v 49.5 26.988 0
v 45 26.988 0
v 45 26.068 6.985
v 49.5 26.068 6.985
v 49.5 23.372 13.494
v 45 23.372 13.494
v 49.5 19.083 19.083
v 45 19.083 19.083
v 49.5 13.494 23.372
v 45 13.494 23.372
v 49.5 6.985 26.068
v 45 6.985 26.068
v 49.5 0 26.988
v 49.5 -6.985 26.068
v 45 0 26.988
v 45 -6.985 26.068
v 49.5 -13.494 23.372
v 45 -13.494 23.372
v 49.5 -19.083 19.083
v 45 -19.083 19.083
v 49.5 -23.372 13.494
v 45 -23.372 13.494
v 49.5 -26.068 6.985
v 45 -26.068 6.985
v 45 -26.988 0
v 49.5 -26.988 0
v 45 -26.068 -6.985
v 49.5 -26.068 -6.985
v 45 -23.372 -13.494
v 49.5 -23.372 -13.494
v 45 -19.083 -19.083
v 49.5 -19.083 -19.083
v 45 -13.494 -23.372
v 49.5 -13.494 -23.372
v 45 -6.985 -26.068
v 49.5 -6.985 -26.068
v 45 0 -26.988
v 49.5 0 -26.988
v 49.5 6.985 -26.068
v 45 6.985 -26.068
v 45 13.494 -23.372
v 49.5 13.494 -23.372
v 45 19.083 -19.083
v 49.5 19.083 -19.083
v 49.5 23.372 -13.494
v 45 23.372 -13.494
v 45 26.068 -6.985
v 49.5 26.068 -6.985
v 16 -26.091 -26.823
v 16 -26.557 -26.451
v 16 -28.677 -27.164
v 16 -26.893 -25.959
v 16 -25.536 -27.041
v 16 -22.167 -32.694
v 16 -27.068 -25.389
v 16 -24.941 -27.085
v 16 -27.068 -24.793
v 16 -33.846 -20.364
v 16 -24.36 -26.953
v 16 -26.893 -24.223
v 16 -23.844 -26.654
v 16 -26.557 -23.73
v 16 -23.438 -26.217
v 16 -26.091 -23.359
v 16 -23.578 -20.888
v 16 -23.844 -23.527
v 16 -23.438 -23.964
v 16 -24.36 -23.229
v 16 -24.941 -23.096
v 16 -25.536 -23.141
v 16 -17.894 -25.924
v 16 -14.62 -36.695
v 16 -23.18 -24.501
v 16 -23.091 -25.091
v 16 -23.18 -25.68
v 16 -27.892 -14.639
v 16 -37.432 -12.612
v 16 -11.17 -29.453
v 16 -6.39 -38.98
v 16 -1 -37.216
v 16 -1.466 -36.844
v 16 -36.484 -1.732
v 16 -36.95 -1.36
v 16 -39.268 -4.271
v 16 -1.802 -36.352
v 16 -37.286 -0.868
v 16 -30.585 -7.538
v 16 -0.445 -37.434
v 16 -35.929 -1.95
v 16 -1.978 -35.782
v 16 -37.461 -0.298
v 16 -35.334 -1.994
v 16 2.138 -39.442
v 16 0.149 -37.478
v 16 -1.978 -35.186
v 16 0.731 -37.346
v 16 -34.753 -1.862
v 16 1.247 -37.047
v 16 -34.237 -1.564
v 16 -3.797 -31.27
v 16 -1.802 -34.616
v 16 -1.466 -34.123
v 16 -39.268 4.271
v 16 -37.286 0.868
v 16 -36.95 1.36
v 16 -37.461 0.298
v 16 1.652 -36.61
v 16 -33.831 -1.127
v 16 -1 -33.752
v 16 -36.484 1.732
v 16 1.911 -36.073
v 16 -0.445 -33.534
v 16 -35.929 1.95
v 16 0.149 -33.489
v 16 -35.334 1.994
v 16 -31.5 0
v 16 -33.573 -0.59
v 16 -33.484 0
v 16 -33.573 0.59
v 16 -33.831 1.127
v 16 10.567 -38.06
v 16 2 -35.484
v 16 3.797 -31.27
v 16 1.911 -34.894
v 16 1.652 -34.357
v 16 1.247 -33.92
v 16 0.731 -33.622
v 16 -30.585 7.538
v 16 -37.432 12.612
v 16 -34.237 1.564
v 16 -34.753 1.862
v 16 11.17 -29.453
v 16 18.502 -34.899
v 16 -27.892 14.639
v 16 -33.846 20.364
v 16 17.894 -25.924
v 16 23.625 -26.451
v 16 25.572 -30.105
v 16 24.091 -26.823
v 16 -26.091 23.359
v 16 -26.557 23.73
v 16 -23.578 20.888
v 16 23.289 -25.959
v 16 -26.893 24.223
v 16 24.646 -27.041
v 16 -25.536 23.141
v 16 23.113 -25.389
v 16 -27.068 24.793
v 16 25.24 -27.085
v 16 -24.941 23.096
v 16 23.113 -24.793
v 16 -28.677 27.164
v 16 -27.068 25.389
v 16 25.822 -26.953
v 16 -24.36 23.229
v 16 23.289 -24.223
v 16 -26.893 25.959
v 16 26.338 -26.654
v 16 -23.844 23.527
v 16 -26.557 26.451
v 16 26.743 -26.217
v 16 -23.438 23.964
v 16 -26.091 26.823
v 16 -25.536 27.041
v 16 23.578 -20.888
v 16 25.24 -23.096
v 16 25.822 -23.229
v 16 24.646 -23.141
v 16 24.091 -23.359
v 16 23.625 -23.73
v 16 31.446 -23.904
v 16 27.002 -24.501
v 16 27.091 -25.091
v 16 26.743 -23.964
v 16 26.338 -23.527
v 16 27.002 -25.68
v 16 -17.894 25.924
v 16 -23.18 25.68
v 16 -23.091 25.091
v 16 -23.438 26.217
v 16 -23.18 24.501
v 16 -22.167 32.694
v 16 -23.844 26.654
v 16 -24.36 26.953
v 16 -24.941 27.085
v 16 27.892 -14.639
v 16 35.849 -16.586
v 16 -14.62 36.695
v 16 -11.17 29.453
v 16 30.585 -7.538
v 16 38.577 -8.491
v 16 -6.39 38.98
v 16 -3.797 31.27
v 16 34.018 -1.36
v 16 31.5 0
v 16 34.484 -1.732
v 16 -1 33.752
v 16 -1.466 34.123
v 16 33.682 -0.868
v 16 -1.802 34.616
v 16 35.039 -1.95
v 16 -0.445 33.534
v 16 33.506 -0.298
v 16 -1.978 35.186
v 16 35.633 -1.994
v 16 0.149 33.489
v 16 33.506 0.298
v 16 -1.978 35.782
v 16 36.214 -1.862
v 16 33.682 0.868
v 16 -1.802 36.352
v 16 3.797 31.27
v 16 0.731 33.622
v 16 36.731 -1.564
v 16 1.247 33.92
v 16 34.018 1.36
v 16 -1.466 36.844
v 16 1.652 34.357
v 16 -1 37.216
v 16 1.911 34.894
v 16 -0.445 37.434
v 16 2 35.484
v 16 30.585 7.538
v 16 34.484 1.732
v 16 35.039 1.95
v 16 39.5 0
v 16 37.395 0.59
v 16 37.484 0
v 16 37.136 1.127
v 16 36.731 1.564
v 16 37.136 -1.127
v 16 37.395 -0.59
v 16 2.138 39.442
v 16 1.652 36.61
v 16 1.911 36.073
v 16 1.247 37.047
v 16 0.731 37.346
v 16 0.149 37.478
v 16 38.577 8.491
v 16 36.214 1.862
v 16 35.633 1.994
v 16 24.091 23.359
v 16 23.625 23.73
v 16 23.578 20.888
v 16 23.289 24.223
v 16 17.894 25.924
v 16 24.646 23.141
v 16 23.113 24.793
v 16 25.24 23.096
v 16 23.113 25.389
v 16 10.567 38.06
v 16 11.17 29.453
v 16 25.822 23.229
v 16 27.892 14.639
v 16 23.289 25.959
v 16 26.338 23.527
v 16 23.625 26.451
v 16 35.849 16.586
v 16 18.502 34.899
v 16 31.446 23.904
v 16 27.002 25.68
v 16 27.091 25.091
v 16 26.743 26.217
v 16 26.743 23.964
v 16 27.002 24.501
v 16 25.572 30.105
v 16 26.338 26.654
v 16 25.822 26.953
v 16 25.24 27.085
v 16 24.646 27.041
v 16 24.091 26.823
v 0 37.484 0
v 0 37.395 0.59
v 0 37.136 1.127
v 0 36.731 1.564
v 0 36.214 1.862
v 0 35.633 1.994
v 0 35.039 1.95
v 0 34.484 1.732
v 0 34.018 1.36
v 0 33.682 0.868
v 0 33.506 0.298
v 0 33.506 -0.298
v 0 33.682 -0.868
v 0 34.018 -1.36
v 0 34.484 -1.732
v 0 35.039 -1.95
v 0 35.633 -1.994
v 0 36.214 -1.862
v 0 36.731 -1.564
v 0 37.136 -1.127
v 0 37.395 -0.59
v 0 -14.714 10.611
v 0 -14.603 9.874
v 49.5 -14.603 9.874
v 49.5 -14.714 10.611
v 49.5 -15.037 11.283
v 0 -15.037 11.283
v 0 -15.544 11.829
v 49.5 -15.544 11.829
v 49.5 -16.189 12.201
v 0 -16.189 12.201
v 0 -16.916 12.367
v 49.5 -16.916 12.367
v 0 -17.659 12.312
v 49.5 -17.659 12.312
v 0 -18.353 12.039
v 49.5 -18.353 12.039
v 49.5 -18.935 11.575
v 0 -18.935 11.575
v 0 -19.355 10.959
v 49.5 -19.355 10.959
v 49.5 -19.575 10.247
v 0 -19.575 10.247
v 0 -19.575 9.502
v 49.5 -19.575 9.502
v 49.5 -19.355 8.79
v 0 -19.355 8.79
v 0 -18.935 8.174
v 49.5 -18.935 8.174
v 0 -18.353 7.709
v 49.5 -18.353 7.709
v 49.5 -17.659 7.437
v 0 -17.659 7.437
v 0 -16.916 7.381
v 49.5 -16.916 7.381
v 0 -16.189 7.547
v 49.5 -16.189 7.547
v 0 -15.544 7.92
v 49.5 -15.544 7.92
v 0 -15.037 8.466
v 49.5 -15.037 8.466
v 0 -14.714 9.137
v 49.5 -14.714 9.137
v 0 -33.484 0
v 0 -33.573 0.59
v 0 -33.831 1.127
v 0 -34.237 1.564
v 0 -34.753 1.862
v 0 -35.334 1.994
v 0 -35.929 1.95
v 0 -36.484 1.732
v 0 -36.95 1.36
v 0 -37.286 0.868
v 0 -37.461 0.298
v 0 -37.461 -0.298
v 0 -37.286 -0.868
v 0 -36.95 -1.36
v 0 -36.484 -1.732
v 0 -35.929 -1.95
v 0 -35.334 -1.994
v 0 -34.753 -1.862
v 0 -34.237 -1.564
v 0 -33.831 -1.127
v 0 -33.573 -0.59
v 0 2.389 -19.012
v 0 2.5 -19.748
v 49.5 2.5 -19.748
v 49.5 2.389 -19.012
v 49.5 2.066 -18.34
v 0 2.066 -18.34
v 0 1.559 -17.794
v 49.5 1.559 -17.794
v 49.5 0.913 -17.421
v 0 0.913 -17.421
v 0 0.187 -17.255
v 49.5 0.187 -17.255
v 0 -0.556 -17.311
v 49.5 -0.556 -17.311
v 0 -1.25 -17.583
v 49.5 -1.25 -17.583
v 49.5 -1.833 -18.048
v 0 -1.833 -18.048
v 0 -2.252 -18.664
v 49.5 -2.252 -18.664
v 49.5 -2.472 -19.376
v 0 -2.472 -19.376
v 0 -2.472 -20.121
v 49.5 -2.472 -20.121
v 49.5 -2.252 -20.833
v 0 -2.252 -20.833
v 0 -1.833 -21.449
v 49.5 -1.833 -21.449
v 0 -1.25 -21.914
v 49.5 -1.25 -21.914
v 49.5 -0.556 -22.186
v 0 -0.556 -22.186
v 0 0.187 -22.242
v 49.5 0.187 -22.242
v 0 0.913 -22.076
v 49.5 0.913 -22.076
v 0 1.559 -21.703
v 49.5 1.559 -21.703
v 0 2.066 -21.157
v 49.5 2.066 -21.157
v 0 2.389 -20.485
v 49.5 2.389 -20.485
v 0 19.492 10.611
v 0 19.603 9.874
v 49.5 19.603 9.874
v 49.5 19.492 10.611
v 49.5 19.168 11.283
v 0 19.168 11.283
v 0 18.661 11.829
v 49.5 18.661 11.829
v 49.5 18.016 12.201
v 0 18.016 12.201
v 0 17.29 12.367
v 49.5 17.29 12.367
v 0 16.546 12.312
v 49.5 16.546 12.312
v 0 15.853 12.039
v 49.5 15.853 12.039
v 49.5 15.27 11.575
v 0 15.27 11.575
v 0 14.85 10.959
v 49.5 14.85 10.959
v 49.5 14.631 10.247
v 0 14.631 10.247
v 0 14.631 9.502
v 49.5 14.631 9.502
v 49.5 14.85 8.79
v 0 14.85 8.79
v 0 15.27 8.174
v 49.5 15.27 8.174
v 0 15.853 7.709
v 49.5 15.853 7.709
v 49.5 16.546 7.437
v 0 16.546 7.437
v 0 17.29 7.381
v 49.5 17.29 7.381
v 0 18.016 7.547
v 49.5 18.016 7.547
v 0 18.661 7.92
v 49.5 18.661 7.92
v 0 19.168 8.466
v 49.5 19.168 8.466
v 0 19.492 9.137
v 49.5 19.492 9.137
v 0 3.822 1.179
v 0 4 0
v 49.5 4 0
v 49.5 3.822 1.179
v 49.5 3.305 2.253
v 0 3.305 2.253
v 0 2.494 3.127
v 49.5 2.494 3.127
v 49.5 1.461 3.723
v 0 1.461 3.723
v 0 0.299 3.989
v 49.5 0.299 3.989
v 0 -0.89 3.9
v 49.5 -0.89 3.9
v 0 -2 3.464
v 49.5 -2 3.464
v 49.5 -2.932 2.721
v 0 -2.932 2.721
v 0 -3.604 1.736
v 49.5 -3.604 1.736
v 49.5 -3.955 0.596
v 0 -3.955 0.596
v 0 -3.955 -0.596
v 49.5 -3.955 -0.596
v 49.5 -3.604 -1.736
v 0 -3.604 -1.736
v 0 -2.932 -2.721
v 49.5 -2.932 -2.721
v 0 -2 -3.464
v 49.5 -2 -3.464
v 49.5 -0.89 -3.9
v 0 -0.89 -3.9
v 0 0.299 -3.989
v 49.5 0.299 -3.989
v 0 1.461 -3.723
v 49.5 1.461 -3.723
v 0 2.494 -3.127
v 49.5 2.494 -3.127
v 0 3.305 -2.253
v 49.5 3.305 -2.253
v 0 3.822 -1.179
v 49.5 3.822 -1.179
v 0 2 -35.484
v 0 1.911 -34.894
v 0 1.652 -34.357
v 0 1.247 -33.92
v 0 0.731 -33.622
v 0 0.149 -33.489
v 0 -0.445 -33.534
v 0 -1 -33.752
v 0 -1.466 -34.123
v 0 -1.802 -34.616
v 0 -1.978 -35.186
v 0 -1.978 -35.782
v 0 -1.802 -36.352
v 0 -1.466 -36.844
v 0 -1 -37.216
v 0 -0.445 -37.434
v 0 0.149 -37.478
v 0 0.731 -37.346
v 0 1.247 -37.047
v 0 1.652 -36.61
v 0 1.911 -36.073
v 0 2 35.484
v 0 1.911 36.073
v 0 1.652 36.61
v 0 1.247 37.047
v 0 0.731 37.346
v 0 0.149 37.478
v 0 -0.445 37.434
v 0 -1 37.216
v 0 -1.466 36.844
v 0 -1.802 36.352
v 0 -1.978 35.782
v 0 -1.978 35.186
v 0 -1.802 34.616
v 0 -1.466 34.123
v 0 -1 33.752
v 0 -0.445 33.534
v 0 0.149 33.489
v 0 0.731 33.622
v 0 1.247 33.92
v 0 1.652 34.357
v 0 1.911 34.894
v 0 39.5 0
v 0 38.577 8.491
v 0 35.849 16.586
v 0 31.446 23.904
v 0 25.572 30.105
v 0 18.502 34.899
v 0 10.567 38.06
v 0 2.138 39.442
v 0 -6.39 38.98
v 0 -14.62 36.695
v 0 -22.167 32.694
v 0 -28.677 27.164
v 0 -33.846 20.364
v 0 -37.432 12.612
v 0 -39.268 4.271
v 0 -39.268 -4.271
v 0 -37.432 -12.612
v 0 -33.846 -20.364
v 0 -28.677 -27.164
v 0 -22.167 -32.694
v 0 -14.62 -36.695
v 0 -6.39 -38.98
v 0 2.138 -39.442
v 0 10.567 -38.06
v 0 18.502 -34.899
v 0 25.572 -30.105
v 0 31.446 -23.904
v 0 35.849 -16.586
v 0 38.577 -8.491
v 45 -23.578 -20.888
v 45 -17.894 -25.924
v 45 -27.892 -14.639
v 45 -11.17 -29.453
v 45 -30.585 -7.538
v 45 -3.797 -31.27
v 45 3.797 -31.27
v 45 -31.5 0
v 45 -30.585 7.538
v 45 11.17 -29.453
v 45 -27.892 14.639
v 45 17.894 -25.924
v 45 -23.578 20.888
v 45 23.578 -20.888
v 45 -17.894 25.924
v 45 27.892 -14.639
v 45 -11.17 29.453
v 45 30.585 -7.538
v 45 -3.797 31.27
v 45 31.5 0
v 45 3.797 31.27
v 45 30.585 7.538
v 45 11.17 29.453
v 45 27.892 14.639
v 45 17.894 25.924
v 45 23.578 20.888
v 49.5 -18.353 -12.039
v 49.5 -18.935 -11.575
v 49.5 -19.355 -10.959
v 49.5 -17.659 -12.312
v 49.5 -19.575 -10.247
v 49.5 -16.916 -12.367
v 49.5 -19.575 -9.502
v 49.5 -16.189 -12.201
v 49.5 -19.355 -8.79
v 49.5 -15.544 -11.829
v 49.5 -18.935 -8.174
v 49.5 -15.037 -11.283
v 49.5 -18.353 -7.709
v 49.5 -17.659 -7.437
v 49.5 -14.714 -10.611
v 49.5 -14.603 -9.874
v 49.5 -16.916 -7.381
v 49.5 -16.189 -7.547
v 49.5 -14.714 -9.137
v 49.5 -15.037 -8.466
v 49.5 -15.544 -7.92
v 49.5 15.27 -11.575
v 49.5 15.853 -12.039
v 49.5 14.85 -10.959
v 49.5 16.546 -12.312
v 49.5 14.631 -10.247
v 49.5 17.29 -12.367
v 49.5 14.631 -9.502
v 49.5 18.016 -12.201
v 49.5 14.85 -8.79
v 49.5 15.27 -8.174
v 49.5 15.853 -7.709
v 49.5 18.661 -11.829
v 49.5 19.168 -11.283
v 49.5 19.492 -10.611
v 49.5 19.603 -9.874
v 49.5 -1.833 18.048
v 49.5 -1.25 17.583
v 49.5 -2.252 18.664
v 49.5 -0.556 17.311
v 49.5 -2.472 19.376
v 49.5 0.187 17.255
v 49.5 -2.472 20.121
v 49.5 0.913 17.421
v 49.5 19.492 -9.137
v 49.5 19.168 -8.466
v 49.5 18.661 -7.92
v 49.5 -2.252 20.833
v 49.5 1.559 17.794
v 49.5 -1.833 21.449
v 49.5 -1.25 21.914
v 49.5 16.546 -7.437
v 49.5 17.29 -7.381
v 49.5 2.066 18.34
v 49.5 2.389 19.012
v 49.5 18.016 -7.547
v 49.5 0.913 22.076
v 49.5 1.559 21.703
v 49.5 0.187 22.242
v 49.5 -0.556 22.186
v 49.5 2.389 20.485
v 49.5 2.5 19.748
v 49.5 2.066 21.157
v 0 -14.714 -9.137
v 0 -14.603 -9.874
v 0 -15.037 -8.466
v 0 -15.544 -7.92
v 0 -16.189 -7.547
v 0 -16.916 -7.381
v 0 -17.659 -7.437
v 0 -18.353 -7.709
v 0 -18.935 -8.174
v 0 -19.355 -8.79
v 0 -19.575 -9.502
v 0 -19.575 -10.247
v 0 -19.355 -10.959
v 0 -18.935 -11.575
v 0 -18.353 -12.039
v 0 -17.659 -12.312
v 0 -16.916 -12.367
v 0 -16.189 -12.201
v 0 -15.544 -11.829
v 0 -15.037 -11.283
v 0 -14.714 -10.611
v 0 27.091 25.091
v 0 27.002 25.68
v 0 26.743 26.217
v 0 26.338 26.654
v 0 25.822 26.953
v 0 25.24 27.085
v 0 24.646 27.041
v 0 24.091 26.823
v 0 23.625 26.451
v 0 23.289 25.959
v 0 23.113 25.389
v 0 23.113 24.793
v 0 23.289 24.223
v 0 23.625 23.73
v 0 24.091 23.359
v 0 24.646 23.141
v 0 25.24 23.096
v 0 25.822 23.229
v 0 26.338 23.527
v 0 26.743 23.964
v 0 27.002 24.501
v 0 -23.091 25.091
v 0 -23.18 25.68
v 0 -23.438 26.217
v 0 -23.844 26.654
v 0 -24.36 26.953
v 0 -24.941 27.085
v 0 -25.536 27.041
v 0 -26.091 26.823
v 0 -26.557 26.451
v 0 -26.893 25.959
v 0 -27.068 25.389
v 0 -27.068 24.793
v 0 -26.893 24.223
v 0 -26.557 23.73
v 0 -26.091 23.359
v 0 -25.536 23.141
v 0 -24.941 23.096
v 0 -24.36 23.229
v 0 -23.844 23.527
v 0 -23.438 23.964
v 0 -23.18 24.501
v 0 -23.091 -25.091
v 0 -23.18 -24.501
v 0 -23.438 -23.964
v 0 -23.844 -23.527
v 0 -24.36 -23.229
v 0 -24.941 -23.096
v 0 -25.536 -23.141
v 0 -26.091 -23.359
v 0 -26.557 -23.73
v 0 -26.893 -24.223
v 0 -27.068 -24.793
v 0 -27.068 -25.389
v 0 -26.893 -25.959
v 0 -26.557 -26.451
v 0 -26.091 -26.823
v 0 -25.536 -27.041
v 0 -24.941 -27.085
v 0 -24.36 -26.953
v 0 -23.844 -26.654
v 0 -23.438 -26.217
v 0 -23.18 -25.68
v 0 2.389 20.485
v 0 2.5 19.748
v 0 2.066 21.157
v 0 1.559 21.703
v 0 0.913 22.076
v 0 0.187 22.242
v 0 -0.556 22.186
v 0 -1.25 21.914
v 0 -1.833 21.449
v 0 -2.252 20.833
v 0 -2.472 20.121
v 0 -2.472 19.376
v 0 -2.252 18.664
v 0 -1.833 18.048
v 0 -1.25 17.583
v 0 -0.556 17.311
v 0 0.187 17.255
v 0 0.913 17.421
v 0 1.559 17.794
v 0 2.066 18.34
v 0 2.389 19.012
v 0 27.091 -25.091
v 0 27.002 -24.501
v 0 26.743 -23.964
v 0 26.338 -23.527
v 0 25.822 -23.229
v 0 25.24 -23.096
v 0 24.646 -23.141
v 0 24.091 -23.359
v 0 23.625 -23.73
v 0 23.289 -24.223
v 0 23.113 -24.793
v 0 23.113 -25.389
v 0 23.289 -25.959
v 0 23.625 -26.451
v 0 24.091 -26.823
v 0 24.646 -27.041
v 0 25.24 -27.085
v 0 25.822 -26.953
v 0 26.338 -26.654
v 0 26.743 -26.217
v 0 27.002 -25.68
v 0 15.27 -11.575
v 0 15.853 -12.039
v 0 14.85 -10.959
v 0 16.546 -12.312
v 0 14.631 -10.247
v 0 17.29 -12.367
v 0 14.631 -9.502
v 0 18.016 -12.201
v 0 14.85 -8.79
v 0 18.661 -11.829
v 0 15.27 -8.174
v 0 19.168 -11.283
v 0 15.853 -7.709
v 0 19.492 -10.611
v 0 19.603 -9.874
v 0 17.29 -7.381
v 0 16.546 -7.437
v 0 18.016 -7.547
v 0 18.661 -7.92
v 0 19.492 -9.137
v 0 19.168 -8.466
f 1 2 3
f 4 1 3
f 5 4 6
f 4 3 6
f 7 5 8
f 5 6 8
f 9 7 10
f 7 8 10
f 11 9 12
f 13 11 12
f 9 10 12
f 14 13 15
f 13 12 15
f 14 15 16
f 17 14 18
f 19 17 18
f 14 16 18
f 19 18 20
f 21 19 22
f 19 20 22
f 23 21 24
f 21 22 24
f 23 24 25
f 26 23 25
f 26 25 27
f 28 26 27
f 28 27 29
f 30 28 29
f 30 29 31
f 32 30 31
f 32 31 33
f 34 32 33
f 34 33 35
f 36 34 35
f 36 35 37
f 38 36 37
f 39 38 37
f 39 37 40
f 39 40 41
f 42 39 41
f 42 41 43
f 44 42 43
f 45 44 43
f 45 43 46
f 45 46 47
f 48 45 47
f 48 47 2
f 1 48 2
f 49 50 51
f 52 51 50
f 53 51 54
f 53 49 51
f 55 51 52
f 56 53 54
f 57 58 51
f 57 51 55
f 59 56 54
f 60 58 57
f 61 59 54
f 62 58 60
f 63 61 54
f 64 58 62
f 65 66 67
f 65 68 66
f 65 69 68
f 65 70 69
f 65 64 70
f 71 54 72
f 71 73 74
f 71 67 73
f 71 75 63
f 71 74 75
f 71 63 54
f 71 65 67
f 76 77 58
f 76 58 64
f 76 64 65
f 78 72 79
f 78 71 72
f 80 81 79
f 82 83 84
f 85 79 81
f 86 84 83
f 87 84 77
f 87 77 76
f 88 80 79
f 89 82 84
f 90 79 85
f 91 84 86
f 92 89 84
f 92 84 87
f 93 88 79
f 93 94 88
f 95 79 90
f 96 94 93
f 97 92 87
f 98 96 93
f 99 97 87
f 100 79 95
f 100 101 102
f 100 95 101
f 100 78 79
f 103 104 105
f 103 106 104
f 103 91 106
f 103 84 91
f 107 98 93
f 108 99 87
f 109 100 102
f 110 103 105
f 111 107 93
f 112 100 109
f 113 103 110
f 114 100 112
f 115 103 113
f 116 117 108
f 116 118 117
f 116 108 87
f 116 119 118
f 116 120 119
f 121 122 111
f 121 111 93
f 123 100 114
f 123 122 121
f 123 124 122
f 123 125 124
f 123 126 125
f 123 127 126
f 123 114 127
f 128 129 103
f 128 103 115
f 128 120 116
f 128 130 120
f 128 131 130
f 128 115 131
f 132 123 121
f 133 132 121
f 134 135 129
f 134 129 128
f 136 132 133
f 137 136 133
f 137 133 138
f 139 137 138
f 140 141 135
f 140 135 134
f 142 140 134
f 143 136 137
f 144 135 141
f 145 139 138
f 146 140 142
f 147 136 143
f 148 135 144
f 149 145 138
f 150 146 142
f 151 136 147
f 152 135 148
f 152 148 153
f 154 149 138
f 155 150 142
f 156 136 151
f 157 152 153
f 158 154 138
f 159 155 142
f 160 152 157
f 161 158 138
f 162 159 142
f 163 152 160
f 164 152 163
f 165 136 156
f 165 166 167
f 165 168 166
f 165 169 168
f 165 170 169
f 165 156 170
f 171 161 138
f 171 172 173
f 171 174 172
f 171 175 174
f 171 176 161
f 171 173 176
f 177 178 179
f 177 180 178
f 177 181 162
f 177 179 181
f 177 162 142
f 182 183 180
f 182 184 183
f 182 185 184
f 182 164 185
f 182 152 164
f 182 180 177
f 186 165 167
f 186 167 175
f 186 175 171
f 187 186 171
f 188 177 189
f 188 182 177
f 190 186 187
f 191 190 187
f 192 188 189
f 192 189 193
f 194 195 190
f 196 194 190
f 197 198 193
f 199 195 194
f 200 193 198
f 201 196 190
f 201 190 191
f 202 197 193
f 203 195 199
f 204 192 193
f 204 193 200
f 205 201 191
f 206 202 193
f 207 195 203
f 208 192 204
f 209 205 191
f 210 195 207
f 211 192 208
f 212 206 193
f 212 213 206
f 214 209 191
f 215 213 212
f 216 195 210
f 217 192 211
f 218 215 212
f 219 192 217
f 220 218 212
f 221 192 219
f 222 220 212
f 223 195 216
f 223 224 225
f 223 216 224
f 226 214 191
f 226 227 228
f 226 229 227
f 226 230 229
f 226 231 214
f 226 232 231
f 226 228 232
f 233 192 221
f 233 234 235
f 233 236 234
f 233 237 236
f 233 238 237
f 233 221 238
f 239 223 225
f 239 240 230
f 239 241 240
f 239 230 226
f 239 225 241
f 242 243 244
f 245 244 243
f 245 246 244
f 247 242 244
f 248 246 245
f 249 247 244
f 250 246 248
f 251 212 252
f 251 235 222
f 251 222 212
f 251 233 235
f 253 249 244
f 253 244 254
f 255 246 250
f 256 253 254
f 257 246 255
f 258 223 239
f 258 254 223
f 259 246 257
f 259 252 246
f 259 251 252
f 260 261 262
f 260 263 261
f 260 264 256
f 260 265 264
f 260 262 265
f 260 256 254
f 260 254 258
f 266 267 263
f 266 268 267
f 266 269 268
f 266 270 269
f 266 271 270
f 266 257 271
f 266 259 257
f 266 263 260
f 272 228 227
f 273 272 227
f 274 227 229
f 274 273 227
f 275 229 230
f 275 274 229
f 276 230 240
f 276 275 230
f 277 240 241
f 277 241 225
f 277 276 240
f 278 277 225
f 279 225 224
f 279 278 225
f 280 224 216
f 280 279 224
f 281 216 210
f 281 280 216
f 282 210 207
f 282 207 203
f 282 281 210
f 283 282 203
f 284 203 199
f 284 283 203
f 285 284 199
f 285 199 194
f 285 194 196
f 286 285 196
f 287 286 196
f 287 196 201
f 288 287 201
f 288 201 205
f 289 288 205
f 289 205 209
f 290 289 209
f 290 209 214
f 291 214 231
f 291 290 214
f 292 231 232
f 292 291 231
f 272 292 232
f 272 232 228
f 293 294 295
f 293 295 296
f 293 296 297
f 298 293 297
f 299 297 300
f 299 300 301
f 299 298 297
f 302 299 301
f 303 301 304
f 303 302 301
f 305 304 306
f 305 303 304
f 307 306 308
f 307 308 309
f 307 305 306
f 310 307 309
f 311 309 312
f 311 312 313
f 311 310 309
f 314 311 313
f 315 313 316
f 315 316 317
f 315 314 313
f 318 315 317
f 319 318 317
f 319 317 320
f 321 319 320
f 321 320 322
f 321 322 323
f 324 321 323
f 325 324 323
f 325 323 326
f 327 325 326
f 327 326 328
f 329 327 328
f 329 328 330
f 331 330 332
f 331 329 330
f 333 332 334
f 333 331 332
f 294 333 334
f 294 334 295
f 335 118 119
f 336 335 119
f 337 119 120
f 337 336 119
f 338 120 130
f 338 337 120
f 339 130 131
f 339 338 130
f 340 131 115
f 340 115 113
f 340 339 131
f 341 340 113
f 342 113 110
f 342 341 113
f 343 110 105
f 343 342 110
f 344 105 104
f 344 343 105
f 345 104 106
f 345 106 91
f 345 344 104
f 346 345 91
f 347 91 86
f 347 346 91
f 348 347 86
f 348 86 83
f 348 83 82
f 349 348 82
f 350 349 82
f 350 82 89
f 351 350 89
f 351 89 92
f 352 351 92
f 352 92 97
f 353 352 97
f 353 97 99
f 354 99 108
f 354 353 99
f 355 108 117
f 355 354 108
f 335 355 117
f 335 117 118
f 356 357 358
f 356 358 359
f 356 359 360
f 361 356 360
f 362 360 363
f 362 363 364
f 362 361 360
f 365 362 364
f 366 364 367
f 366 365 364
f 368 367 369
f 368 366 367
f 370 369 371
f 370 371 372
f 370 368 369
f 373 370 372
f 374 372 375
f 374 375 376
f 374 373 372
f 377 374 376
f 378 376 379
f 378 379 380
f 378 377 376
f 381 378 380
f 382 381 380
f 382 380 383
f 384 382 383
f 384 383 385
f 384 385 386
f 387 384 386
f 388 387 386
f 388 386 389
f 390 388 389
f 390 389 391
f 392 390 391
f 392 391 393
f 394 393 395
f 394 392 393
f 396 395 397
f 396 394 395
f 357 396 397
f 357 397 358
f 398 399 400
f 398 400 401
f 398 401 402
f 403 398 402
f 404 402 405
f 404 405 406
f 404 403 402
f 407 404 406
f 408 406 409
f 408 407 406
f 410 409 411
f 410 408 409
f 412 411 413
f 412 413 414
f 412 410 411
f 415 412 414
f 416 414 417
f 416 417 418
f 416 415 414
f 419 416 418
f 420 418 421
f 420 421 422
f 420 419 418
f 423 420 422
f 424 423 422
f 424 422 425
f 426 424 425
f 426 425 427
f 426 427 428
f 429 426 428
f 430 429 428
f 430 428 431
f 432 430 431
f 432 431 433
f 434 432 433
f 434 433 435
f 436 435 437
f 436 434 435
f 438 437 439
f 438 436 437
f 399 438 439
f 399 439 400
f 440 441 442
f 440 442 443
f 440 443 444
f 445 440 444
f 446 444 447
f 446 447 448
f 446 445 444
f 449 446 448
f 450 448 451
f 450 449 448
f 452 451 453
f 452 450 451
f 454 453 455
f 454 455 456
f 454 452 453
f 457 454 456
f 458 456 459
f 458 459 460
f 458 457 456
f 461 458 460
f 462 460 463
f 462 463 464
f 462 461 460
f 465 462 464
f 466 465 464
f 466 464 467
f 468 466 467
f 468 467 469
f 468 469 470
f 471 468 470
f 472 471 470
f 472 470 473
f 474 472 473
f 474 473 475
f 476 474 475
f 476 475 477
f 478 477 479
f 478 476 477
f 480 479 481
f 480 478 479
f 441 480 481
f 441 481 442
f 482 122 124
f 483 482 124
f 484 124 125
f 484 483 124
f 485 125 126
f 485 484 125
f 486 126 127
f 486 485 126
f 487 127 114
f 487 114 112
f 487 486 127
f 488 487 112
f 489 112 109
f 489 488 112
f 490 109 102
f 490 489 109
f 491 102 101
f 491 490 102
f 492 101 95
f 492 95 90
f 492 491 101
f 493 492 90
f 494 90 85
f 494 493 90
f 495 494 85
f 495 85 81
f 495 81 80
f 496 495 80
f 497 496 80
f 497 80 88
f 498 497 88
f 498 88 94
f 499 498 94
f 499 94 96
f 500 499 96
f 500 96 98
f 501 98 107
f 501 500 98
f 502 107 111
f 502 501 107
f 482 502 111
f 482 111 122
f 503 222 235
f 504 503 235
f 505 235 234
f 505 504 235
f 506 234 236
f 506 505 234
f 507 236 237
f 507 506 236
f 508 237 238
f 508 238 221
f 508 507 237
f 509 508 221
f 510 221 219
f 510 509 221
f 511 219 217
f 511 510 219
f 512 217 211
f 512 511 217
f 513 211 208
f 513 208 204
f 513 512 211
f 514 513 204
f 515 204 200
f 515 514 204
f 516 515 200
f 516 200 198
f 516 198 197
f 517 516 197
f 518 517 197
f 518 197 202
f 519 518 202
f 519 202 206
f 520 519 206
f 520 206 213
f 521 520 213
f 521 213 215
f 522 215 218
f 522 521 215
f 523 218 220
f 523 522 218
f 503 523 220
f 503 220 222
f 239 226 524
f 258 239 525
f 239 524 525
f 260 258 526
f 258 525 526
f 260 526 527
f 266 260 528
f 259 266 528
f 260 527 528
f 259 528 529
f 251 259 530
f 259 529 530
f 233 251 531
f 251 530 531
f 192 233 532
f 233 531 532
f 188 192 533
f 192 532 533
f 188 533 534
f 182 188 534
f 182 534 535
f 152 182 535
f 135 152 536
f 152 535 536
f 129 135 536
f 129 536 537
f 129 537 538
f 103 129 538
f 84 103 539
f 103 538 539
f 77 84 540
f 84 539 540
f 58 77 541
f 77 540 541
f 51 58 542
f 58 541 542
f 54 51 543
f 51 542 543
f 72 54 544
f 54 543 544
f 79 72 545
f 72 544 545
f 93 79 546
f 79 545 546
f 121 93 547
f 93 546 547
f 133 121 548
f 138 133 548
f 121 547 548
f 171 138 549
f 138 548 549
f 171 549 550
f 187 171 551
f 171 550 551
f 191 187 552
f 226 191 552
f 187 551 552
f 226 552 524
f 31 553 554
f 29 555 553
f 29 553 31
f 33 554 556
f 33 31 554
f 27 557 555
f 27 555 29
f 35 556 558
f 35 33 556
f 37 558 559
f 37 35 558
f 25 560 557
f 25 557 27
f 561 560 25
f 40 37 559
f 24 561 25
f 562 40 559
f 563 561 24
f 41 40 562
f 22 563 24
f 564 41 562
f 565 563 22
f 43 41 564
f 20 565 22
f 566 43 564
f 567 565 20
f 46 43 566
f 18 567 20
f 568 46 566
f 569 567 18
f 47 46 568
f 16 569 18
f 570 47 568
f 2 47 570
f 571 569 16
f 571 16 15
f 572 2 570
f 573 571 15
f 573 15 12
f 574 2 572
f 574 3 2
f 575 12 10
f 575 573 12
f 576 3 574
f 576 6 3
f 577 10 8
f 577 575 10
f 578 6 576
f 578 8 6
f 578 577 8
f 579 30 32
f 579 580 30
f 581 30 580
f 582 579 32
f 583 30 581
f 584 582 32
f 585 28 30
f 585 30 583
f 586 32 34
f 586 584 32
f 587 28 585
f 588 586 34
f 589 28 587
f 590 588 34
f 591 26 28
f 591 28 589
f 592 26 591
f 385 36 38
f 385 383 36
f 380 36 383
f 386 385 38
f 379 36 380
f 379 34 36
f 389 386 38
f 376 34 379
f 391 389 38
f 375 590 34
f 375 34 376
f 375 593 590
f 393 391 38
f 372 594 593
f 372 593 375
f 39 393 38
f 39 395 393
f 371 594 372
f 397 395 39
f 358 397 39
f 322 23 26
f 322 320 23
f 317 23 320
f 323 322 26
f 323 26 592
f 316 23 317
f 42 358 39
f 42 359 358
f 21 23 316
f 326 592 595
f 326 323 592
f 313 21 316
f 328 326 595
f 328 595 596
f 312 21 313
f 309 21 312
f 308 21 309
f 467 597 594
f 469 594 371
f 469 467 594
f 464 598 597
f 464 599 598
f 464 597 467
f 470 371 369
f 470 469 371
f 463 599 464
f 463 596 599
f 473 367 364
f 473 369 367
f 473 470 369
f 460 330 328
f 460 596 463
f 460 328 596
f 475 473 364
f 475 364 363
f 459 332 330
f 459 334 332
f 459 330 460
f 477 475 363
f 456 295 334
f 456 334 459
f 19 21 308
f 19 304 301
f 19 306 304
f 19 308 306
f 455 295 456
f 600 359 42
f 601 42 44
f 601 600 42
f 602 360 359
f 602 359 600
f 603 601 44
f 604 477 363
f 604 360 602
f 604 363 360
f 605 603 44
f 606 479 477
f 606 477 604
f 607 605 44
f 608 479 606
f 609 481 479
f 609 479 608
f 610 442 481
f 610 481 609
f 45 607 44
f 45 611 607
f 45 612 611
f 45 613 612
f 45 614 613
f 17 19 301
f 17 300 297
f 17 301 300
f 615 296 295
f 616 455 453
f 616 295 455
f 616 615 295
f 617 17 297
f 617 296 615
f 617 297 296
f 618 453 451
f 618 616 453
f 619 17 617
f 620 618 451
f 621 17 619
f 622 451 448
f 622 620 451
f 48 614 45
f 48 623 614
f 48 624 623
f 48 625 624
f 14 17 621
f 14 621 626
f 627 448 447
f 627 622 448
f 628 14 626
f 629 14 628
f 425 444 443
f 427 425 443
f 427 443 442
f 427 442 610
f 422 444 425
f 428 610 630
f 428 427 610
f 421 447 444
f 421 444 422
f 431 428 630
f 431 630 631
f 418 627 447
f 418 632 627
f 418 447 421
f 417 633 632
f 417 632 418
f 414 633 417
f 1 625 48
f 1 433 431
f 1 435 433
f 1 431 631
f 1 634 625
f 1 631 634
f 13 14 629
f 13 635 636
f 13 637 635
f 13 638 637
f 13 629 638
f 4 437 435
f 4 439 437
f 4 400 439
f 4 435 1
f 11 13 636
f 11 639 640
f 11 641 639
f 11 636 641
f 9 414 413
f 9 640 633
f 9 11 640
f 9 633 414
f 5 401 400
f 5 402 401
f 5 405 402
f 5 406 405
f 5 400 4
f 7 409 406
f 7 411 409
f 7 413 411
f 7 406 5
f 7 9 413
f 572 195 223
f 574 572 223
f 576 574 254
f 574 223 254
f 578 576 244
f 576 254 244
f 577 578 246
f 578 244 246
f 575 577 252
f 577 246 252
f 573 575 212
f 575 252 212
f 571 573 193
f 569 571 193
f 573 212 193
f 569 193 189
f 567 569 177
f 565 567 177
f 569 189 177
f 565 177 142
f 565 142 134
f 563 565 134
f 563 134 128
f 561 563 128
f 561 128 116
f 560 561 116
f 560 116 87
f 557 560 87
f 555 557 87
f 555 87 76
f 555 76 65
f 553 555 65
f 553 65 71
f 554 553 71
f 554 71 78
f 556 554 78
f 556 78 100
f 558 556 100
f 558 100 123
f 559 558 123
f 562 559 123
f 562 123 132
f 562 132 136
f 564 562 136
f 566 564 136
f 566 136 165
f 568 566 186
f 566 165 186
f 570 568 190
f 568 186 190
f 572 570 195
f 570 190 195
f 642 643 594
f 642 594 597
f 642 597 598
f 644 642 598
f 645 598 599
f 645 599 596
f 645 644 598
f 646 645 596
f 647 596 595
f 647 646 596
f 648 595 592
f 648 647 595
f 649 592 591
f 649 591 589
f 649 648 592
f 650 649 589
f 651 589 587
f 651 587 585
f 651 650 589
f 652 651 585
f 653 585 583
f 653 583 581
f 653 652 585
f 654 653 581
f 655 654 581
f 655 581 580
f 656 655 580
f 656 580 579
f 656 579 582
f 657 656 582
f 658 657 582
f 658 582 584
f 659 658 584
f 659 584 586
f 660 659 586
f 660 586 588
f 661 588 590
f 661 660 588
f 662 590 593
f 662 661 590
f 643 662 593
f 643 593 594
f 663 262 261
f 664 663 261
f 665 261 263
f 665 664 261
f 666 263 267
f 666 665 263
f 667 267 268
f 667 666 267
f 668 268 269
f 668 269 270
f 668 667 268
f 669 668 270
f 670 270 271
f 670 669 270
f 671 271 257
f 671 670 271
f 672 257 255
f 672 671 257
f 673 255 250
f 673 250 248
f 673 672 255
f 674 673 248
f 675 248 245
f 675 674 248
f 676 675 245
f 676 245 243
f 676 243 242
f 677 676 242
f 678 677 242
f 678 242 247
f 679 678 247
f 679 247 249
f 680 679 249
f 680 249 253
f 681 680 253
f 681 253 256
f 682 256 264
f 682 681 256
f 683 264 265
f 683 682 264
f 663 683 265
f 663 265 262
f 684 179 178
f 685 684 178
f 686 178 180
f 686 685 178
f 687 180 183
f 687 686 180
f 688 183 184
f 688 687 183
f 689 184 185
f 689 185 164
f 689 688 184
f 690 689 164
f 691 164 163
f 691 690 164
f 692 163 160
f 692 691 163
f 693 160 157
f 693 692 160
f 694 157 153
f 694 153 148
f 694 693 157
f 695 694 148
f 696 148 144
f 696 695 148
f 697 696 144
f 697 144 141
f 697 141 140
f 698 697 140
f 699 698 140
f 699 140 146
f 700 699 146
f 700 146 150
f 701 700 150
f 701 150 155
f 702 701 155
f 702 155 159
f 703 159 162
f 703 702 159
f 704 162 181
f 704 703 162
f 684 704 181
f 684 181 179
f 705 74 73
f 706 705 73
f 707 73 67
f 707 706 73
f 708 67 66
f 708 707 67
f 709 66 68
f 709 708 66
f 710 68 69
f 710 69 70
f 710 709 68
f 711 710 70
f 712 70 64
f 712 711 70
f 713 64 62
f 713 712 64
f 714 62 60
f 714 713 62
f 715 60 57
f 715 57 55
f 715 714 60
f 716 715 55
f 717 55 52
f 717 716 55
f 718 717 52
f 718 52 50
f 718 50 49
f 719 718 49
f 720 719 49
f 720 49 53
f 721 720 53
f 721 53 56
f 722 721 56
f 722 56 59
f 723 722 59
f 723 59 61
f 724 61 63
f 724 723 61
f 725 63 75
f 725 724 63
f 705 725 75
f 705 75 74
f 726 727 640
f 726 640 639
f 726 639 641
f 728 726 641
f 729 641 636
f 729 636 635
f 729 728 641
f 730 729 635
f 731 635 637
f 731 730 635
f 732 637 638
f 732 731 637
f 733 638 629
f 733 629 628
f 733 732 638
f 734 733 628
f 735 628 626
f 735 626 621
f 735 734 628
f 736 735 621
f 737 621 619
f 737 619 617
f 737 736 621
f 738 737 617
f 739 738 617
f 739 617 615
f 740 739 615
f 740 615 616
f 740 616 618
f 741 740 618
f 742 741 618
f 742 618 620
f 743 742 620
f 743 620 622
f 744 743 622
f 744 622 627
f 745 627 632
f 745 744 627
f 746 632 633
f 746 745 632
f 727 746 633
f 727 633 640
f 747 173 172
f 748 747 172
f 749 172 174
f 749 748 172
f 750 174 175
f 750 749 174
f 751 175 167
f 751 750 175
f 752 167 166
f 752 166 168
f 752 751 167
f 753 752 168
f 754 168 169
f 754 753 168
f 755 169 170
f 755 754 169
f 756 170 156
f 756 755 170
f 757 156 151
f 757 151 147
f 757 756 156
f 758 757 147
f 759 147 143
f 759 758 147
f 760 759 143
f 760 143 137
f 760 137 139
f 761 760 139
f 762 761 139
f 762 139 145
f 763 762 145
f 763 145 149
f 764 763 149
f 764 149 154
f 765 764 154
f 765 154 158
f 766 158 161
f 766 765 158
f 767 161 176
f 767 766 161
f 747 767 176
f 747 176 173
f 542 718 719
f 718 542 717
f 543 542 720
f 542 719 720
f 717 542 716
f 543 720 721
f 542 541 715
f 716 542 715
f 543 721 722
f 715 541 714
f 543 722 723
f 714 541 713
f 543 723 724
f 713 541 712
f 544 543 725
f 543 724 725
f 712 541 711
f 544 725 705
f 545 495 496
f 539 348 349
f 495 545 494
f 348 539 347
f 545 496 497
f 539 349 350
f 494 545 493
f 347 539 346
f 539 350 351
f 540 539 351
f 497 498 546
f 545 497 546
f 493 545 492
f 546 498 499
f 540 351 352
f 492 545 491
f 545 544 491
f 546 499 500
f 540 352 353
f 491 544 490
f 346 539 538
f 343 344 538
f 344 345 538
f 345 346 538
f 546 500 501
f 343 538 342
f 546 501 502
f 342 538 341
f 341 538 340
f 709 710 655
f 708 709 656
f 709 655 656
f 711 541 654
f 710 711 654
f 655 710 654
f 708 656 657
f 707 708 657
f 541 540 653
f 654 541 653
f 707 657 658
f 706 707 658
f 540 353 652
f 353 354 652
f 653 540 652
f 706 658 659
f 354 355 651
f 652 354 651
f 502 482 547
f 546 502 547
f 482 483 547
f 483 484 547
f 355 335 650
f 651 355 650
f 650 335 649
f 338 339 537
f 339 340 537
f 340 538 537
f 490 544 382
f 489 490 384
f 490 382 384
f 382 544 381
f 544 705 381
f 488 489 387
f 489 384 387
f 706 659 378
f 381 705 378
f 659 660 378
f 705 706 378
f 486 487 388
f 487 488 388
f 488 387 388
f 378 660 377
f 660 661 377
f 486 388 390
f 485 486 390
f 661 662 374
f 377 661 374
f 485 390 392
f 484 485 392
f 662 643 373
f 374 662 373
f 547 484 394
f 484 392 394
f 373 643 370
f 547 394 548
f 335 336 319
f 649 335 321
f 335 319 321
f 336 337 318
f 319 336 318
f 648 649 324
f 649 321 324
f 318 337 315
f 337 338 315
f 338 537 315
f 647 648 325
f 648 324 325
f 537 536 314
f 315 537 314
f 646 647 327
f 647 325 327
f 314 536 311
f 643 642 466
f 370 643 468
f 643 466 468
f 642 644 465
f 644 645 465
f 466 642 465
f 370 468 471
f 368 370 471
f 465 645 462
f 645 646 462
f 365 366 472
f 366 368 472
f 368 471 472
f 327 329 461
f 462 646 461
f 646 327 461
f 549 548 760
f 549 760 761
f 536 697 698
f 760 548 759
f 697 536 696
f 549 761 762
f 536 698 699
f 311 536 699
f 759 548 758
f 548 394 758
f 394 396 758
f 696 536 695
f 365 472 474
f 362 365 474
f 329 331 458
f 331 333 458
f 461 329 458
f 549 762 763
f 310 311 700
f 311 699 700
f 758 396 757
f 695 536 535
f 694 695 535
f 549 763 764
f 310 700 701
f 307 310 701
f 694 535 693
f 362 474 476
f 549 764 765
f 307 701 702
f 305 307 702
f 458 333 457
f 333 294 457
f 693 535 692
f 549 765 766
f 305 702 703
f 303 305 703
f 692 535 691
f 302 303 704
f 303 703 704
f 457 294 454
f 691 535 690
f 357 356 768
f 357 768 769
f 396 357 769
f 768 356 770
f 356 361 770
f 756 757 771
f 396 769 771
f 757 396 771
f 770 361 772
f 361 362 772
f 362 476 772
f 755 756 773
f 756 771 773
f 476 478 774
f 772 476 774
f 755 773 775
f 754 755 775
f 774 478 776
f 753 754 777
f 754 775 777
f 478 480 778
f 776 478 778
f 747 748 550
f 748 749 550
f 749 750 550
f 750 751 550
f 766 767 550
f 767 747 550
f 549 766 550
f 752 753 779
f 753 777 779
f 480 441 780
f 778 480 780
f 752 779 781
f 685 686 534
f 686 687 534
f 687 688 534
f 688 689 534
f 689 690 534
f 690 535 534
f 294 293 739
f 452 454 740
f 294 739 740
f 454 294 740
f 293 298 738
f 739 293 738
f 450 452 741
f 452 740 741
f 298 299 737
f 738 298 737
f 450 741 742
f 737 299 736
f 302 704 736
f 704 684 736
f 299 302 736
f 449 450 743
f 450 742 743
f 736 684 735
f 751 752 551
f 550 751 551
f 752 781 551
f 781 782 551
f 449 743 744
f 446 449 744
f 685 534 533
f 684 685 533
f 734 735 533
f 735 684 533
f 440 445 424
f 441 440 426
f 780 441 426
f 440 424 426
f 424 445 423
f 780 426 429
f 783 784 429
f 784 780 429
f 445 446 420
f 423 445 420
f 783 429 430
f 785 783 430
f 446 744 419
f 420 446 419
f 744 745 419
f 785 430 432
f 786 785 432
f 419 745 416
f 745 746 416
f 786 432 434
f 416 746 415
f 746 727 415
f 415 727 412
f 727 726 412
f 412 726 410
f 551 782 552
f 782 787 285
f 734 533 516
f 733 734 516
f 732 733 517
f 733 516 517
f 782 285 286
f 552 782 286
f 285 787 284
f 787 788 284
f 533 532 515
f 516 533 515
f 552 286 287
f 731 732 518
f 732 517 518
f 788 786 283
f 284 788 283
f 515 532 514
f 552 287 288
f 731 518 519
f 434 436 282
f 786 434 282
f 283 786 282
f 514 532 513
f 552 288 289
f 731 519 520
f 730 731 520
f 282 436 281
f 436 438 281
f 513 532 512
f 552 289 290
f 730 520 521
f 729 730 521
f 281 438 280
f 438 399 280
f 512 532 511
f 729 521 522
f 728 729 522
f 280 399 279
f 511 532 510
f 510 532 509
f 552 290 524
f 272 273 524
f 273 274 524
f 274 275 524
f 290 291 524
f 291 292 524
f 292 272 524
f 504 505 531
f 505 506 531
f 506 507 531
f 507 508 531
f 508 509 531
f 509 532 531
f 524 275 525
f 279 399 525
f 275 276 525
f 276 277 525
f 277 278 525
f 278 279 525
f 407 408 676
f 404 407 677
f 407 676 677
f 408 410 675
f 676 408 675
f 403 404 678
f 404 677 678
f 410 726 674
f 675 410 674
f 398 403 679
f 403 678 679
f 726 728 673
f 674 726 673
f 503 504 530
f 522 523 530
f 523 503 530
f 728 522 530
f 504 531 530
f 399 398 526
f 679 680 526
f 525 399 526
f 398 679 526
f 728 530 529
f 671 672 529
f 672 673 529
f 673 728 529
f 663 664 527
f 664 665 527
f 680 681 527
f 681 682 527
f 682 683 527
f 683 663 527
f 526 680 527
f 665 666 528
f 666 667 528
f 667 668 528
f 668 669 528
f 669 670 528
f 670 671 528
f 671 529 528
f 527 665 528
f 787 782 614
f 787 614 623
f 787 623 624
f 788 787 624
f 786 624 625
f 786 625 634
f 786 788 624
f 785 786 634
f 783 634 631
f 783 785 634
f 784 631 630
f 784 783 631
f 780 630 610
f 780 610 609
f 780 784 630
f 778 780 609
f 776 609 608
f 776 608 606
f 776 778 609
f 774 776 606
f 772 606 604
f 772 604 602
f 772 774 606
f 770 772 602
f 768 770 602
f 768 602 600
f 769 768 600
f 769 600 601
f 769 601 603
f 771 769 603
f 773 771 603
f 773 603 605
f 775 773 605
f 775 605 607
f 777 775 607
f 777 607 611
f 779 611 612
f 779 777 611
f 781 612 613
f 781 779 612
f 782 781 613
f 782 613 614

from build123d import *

# Parameters (mm, degrees)
F0_R     = 31.5
F0_R_2   = 26.9875
F1_DEPTH = 45
F0_R_3   = 39.5
F0_R_4   = 2
F2_DEPTH = 16
F0_R_5   = 2.5
F0_R_6   = 4
F3_DEPTH = 49.5


with BuildPart() as f1:
    # F0 (on Right) → F1 (new body)
    with BuildSketch(Plane.YZ):
        Circle(F0_R)
        Circle(F0_R_2, mode=Mode.SUBTRACT)
    extrude(amount=F1_DEPTH)

    # F0 (on Right) → F2 (join)
    with BuildSketch(Plane.YZ):
        Circle(F0_R_3)
        with Locations((-25.090836, -25.090836)):
            Circle(F0_R_4, mode=Mode.SUBTRACT)
        with Locations((0, -35.4838)):
            Circle(F0_R_4, mode=Mode.SUBTRACT)
        with Locations((25.090836, -25.090836)):
            Circle(F0_R_4, mode=Mode.SUBTRACT)
        with Locations((-35.4838, 0)):
            Circle(F0_R_4, mode=Mode.SUBTRACT)
        with Locations((-25.090836, 25.090836)):
            Circle(F0_R_4, mode=Mode.SUBTRACT)
        Circle(F0_R, mode=Mode.SUBTRACT)
        with Locations((35.4838, 0)):
            Circle(F0_R_4, mode=Mode.SUBTRACT)
        with Locations((0, 35.4838)):
            Circle(F0_R_4, mode=Mode.SUBTRACT)
        with Locations((25.090836, 25.090836)):
            Circle(F0_R_4, mode=Mode.SUBTRACT)
    extrude(amount=F2_DEPTH)

    # F0 (on Right) → F3 (join)
    with BuildSketch(Plane.YZ):
        Circle(F0_R_2)
        with Locations((-17.102703, -9.87425)):
            Circle(F0_R_5, mode=Mode.SUBTRACT)
        with Locations((0, -19.7485)):
            Circle(F0_R_5, mode=Mode.SUBTRACT)
        with Locations((17.102703, -9.87425)):
            Circle(F0_R_5, mode=Mode.SUBTRACT)
        with Locations((-17.102703, 9.87425)):
            Circle(F0_R_5, mode=Mode.SUBTRACT)
        Circle(F0_R_6, mode=Mode.SUBTRACT)
        with Locations((17.102703, 9.87425)):
            Circle(F0_R_5, mode=Mode.SUBTRACT)
        with Locations((0, 19.7485)):
            Circle(F0_R_5, mode=Mode.SUBTRACT)
    extrude(amount=F3_DEPTH)


solid = f1.part
